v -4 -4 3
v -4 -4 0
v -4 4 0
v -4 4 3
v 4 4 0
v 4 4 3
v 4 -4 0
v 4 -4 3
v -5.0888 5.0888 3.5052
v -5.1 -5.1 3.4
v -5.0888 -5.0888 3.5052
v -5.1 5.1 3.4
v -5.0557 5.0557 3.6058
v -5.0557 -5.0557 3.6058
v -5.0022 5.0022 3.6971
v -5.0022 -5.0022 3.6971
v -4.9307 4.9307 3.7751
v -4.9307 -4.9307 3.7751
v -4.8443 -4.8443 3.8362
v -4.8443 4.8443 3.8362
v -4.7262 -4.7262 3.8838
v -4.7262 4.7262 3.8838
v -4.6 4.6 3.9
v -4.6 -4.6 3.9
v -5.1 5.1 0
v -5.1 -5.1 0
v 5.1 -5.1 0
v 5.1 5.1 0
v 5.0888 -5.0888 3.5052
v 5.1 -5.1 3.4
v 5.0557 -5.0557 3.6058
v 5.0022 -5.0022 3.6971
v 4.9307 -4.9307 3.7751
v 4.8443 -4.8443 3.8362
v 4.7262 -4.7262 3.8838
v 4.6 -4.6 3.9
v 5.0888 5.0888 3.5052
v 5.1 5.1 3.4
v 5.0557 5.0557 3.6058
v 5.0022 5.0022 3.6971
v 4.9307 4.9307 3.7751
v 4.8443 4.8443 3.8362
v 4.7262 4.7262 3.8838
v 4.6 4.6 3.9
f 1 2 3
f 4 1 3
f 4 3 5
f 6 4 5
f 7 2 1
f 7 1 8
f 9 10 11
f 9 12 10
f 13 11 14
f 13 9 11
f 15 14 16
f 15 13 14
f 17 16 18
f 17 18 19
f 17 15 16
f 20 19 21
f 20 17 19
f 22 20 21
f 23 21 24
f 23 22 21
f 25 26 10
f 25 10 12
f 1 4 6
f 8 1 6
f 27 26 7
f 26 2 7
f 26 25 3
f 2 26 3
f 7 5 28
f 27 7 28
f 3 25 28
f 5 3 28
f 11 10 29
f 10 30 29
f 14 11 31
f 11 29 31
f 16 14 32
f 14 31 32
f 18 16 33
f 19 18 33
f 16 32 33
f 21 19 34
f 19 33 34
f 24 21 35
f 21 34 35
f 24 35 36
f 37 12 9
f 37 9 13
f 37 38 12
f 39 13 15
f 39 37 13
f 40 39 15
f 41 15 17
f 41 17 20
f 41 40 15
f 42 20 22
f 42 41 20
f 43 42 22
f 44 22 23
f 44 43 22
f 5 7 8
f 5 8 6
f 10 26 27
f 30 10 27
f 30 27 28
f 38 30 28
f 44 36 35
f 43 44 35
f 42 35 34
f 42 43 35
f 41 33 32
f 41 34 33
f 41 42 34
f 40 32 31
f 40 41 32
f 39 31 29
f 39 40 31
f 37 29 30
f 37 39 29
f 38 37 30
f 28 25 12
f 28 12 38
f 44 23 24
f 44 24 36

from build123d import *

# Parameters (mm, degrees)
BOX001_W     = 8
BOX001_H     = 8
BOX001_DEPTH = 3
BOX_W        = 10.2
BOX_H        = 10.2
BOX_DEPTH    = 3.9
FILLET_R     = 0.5


with BuildPart() as cube001:
    # Box001 → Box001 (new body)
    with BuildSketch(Plane(origin=(-4, -4, 0), x_dir=(1, 0, 0), z_dir=(0, 0, 1))):
        with Locations((4, 4)):
            Rectangle(BOX001_W, BOX001_H)
    extrude(amount=BOX001_DEPTH)


with BuildPart() as fillet_body:
    # Box → Box (new body)
    with BuildSketch(Plane(origin=(-5.1, -5.1, 0), x_dir=(1, 0, 0), z_dir=(0, 0, 1))):
        with Locations((5.1, 5.1)):
            Rectangle(BOX_W, BOX_H)
    extrude(amount=BOX_DEPTH)

    # Cut: cut Cube001
    add(cube001.part, mode=Mode.SUBTRACT)

    # Fillet
    fillet_edges = [fillet_body.edges().sort_by_distance(p)[0] for p in [
        (-5.1, 0, 3.9),
        (0, -5.1, 3.9),
        (0, 5.1, 3.9),
        (5.1, 0, 3.9),
    ]]
    fillet(fillet_edges, radius=FILLET_R)


solid = fillet_body.part
